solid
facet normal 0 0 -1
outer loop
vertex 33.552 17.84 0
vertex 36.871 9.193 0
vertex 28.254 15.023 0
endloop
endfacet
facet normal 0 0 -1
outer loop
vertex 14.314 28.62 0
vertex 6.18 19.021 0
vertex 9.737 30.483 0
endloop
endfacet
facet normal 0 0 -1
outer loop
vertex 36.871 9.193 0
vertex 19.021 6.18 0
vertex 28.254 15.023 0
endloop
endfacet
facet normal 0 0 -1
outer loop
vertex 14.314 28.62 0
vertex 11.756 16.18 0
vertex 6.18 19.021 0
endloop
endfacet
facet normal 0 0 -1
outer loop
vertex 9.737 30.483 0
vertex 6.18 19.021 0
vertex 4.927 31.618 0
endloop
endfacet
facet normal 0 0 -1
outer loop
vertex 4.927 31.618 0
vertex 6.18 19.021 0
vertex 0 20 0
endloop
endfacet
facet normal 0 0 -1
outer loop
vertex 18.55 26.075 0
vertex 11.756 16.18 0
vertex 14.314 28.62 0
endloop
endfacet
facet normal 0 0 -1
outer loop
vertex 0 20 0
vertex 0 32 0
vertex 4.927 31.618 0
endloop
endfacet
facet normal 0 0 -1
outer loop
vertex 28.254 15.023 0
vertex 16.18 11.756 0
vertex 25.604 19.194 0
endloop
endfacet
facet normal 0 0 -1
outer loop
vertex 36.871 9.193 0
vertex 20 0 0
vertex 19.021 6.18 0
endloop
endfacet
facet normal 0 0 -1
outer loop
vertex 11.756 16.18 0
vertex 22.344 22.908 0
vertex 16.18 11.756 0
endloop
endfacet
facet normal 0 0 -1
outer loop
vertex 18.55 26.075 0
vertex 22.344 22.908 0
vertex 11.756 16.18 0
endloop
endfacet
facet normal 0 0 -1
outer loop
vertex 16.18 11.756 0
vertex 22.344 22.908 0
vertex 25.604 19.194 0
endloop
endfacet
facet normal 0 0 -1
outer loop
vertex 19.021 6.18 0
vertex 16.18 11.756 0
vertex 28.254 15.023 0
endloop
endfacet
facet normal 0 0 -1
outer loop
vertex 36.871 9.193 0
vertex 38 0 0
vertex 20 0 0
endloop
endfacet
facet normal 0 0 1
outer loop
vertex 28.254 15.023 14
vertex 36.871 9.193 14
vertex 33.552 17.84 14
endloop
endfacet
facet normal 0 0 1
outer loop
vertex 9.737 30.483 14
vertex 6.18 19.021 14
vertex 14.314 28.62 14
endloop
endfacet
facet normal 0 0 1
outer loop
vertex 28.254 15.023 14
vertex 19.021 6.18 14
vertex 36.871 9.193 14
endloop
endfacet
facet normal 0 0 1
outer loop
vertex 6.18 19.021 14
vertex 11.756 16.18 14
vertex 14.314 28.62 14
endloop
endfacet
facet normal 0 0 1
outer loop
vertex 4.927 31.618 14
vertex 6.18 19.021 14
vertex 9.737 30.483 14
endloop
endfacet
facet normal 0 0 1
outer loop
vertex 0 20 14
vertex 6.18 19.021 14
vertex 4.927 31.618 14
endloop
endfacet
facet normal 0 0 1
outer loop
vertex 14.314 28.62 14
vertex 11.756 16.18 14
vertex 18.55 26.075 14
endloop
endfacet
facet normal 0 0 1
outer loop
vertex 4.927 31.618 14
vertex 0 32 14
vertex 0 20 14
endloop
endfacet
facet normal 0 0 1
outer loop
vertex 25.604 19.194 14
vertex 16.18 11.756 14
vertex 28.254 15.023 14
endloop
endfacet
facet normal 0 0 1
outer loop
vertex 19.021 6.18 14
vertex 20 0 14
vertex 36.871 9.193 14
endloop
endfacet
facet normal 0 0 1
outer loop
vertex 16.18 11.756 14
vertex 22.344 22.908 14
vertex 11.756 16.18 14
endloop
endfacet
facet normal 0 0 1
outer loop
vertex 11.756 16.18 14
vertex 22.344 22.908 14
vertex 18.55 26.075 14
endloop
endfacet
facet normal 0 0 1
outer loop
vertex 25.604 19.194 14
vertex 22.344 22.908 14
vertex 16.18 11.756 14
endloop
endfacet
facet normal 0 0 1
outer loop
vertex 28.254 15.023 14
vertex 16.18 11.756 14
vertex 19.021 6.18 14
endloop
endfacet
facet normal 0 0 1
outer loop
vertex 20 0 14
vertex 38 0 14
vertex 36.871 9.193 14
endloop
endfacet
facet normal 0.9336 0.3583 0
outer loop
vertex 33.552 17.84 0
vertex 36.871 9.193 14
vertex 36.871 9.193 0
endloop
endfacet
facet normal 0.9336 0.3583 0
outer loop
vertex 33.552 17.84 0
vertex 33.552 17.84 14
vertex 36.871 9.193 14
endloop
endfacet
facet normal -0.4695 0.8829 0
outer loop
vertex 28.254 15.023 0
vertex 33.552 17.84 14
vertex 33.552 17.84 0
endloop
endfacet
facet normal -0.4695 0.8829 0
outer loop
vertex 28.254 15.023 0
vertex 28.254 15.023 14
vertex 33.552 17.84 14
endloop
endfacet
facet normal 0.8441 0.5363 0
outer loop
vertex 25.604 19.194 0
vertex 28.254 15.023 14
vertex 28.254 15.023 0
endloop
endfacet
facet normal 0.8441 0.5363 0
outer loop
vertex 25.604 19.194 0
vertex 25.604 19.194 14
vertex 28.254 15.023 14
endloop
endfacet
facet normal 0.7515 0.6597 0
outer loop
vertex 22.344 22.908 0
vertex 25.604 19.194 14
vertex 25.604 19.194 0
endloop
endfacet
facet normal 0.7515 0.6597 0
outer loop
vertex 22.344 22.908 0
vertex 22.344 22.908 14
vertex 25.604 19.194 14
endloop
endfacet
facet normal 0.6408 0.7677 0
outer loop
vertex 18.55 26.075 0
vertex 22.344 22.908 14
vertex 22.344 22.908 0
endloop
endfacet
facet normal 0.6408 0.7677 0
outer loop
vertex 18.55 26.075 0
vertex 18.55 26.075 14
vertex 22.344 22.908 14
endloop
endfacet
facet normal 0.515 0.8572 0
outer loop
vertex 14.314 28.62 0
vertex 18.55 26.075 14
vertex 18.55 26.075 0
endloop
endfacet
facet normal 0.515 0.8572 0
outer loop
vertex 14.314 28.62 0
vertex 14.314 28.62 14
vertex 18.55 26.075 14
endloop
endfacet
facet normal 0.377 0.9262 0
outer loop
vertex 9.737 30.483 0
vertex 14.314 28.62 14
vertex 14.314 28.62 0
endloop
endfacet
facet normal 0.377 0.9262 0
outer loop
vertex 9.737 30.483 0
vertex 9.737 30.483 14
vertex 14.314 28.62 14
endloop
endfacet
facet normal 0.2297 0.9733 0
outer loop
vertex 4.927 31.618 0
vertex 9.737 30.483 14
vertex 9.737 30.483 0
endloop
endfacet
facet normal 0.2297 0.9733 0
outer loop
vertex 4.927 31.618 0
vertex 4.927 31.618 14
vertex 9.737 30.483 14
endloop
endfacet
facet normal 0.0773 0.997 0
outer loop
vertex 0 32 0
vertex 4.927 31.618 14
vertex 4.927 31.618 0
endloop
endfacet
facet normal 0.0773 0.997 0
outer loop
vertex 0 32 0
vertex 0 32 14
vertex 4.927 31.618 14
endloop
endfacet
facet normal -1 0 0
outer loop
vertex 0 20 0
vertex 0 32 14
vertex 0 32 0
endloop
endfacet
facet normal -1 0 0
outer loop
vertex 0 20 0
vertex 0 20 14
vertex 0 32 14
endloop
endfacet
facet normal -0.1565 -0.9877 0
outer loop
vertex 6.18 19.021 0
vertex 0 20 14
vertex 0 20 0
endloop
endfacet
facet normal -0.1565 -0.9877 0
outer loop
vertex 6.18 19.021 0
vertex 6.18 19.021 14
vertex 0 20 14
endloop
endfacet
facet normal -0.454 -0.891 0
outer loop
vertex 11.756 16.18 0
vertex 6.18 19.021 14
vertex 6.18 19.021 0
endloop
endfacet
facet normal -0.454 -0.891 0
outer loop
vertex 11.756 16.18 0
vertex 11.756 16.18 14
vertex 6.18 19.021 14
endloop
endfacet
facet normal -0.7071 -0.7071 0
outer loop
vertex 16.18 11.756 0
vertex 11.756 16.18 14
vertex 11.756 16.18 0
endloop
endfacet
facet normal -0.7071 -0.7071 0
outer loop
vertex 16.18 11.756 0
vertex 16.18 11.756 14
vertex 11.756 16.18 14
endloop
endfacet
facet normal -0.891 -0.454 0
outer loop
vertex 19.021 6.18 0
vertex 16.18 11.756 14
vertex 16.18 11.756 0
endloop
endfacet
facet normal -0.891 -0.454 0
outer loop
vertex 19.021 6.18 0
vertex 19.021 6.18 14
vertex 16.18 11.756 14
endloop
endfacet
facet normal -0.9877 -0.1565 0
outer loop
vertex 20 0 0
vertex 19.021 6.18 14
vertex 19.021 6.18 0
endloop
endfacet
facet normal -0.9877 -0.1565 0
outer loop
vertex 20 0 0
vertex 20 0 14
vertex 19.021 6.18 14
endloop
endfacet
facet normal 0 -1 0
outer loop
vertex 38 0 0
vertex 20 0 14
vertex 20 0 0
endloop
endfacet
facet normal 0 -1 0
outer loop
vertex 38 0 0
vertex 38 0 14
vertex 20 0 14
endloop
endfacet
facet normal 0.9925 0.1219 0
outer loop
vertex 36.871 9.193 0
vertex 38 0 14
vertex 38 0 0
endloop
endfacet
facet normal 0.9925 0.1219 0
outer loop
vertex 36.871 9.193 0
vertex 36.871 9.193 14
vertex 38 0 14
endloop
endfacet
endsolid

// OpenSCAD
$fn = 32;

// ----------------------------------------------------------------------
// Arc stop: segment, 14 mm thick
// ----------------------------------------------------------------------

// --- parameters (mm) ---
profile_height = 14;      // extrusion height
profile_points = 17;      // points of the closed outline

profile = [[38, 0], [36.871, 9.193], [33.552, 17.84], [28.254, 15.023], [25.604, 19.194], [22.344, 22.908], [18.55, 26.075], [14.314, 28.62], [9.737, 30.483], [4.927, 31.618], [0, 32], [0, 20], [6.18, 19.021], [11.756, 16.18], [16.18, 11.756], [19.021, 6.18], [20, 0]];  // single closed polygon, 17 points, counter clockwise

// --- the one profile operation ---
linear_extrude(height = profile_height) polygon(points = profile);
